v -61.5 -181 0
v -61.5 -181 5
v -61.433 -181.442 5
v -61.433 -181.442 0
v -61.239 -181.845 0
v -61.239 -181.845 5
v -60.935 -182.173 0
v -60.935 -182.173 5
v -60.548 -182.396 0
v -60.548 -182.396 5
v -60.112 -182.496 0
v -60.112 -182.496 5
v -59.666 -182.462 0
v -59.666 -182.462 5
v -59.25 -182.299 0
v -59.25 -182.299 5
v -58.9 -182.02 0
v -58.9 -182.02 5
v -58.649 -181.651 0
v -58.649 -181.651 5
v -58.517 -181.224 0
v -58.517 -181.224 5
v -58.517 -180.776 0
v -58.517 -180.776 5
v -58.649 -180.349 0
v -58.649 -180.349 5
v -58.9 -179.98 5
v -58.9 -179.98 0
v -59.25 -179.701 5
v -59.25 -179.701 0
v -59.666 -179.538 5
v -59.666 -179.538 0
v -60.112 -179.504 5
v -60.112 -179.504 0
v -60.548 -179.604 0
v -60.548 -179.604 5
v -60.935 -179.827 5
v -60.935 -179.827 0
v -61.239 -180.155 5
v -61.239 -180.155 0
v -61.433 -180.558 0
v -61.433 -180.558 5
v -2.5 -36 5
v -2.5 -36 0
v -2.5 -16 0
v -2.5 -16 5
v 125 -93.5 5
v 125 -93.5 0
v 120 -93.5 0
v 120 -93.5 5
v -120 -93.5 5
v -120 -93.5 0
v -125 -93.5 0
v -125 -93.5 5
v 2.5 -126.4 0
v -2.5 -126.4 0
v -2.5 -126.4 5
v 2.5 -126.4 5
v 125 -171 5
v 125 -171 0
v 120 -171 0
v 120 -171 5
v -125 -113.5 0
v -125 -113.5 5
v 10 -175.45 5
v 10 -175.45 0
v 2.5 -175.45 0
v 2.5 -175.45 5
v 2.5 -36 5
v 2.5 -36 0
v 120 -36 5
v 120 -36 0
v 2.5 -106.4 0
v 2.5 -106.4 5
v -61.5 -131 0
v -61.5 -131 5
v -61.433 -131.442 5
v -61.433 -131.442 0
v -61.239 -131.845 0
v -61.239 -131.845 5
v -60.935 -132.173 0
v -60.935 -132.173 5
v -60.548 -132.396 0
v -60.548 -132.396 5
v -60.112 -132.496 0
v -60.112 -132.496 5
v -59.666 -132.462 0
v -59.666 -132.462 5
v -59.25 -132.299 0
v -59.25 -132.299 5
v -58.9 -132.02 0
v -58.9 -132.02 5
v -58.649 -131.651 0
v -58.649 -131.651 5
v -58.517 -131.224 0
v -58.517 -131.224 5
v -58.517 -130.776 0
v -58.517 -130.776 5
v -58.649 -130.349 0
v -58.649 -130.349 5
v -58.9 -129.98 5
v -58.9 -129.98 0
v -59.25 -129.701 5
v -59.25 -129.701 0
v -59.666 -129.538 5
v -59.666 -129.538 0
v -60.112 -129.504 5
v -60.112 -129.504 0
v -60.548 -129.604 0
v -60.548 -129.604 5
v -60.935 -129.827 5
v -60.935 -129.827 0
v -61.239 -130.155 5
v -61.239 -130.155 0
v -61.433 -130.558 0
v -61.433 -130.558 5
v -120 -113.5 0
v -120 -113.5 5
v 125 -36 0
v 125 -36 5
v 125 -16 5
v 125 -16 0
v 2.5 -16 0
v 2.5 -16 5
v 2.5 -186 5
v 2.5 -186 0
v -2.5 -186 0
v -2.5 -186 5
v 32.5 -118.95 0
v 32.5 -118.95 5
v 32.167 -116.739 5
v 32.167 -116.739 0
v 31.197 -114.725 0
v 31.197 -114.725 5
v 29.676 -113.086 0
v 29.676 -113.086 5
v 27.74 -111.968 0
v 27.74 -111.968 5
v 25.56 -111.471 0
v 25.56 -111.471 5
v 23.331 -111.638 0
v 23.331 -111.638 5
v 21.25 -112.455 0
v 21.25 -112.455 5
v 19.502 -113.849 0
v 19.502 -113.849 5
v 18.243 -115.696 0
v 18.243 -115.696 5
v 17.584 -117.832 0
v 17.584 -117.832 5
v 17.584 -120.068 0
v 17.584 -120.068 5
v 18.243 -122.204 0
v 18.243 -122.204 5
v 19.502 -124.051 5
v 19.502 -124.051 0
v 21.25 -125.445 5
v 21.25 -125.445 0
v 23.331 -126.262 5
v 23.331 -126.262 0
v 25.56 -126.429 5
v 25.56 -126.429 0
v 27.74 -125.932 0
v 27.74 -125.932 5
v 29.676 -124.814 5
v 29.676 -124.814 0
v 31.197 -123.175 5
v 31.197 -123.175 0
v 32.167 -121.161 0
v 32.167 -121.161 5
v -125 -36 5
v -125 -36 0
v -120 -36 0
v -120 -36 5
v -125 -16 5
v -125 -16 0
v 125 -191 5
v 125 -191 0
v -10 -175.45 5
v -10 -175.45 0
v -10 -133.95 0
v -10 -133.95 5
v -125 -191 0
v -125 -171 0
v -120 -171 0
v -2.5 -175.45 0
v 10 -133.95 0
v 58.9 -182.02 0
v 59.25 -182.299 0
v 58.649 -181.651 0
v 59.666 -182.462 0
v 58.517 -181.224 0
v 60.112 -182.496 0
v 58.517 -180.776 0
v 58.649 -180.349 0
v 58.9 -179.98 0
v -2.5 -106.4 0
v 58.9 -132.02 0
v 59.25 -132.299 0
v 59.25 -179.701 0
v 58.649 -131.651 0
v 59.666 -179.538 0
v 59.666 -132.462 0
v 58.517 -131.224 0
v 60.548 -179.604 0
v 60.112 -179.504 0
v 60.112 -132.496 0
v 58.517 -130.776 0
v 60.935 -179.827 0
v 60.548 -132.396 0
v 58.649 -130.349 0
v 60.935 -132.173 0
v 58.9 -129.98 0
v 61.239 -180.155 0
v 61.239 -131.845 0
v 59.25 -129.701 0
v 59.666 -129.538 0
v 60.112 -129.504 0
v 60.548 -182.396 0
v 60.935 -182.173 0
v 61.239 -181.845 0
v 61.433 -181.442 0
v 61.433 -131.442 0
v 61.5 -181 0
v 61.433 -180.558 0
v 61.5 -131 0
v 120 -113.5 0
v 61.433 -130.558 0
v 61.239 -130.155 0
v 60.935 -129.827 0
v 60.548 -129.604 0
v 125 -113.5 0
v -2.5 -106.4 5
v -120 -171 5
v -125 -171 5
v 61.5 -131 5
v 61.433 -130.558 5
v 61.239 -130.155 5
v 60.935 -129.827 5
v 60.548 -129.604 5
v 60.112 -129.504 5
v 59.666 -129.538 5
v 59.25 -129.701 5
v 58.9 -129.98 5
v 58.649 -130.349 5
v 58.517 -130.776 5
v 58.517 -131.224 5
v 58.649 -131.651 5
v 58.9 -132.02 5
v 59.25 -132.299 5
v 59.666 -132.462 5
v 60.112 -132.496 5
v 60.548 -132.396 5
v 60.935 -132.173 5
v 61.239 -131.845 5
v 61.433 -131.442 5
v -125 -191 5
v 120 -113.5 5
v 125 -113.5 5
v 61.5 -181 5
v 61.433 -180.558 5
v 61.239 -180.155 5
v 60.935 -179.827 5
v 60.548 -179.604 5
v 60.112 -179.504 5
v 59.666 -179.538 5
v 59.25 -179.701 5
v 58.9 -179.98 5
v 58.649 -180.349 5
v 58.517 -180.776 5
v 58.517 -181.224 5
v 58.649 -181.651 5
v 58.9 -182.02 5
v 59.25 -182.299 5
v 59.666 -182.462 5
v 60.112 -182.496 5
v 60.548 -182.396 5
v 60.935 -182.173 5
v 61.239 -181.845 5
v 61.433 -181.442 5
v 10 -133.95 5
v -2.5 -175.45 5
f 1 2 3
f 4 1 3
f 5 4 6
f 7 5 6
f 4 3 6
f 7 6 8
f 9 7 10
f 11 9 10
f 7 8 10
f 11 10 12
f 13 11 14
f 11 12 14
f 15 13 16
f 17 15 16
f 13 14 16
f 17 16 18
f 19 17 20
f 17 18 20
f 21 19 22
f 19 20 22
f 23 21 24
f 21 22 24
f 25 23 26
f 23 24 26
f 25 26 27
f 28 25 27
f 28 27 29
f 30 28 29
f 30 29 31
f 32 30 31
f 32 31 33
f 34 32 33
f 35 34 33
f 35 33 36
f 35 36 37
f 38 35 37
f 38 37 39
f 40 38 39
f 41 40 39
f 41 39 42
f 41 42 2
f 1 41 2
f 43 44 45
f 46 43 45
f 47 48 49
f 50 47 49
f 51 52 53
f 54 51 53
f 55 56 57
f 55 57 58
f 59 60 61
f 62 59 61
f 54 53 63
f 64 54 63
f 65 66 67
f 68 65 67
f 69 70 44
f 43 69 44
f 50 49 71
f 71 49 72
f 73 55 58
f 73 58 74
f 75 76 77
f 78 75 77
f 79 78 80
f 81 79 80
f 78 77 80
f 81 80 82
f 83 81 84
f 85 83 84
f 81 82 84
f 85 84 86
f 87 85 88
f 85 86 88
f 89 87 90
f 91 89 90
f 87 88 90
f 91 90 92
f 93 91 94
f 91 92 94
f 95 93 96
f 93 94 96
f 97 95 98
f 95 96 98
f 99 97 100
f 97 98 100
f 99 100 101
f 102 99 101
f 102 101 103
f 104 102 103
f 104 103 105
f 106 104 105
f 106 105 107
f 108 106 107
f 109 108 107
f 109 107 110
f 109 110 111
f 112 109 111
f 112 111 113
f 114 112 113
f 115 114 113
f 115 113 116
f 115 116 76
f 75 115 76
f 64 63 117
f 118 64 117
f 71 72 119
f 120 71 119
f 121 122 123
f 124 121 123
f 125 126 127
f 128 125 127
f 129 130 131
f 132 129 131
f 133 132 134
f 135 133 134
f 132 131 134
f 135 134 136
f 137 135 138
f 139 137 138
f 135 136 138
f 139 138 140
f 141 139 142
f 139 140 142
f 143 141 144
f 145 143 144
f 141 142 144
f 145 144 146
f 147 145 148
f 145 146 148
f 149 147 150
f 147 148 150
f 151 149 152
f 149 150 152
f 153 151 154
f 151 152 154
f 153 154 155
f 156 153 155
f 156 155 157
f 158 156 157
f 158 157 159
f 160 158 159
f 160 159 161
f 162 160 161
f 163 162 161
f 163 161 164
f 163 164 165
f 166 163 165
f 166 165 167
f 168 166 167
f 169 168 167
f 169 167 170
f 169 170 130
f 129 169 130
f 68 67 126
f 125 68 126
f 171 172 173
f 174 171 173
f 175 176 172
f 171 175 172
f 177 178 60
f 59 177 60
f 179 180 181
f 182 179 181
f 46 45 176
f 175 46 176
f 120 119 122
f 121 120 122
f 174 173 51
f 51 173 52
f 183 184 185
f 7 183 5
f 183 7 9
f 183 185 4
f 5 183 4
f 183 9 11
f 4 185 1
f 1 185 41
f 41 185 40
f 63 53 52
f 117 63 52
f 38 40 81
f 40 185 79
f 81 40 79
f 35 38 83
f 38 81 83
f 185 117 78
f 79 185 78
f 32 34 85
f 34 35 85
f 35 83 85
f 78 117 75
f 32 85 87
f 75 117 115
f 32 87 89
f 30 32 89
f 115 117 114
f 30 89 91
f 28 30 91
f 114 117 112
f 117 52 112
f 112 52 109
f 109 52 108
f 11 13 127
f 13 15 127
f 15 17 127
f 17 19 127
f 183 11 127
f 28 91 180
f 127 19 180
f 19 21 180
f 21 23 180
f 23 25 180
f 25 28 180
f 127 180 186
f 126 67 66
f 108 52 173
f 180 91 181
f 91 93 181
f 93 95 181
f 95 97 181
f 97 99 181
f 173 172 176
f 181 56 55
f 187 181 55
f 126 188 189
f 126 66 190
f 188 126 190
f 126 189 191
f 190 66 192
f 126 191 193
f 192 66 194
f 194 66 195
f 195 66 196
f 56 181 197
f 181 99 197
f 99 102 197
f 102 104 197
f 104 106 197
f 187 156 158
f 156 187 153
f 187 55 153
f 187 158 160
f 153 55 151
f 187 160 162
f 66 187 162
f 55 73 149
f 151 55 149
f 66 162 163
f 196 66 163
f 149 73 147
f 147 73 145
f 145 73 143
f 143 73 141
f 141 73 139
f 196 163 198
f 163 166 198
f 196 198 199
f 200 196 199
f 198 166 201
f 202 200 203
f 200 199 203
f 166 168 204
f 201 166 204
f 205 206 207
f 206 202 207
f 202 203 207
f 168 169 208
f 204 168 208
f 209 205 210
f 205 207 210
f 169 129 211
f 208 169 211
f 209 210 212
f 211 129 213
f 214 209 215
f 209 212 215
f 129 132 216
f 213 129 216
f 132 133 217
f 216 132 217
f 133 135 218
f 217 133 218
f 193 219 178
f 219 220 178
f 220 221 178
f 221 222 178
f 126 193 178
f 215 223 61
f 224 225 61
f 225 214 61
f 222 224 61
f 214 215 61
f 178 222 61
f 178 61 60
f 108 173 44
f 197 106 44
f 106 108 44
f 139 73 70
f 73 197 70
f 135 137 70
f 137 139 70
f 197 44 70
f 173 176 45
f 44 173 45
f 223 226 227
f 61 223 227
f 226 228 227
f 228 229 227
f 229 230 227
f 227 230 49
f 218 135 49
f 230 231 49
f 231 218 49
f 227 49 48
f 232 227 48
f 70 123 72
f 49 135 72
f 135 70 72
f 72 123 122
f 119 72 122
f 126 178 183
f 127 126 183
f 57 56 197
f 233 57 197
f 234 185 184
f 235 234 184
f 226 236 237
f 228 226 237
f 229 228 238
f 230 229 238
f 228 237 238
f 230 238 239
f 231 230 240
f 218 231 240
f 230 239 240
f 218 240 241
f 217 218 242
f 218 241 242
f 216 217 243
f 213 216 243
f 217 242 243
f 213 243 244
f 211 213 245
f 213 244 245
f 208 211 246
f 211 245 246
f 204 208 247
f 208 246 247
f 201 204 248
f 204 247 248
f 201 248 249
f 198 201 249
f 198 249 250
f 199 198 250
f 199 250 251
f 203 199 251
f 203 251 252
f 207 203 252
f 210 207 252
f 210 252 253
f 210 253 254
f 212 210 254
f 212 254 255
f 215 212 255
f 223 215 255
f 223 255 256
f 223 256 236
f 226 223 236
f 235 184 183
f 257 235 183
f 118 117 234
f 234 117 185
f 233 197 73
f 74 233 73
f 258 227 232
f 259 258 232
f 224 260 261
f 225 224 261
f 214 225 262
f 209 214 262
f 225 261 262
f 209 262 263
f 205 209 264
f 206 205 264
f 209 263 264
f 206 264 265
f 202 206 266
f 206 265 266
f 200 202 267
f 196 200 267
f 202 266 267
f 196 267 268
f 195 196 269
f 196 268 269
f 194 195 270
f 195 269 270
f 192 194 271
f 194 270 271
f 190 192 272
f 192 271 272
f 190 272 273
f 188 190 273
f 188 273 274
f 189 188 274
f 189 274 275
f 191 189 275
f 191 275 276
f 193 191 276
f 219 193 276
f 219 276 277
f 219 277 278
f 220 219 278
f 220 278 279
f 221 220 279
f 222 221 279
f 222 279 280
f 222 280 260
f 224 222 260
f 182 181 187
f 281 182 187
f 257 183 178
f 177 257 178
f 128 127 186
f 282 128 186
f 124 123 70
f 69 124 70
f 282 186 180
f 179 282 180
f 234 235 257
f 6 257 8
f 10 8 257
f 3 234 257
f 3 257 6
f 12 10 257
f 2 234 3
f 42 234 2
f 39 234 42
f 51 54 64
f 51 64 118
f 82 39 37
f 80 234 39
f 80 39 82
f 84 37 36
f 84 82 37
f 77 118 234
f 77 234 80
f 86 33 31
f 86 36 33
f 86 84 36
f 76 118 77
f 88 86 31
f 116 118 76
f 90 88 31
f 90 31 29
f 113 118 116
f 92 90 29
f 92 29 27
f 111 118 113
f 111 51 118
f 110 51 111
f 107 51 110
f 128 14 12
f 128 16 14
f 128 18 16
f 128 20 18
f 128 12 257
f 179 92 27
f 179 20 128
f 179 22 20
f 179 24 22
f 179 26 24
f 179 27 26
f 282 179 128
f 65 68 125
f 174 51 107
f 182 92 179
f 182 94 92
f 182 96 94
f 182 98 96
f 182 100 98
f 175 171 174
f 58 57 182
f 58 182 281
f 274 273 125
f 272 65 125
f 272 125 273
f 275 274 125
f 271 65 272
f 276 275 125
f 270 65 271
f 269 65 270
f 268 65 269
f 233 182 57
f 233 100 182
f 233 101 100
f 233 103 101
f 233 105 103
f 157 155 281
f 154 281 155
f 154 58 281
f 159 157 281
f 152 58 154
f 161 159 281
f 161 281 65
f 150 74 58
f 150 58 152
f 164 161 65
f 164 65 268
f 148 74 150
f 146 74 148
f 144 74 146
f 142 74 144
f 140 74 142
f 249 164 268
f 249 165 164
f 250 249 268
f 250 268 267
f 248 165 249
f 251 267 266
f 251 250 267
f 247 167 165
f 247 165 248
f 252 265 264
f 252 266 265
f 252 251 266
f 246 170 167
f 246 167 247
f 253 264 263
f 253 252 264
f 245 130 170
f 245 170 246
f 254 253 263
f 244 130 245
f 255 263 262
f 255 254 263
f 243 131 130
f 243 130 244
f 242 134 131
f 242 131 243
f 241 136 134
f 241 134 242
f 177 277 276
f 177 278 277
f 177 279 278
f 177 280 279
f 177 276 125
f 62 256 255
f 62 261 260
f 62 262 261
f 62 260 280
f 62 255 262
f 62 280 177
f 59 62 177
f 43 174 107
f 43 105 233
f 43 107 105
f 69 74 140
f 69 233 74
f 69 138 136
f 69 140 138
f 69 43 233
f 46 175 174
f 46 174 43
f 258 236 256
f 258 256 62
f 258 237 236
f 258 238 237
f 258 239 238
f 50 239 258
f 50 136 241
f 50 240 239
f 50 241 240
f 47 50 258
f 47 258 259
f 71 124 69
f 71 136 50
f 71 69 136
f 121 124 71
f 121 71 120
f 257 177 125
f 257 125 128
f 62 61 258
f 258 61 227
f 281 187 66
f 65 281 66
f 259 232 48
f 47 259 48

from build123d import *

# Parameters (mm, degrees)
BOSS_EXTRU_1_OUTLINE_W  = 5
BOSS_EXTRU_1_OUTLINE_H  = 20
BOSS_EXTRU_1_DEPTH      = 5
ESQUISSE2_R             = 1.5
ENL_V_MAT_EXTRU_1_DEPTH = 229.322140845
ESQUISSE3_R             = 7.5
ENL_V_MAT_EXTRU_2_DEPTH = 229.322140845


# Read off the part's stored shape, not the designer's step: Boss.-Extru.1
with BuildPart() as part:
    # Boss.-Extru.1 outline → Boss.-Extru.1 (new body)
    with BuildSketch(Plane.XY):
        Polygon((125, -16), (2.5, -16), (2.5, -36), (-2.5, -36), (-2.5, -16), (-125, -16), (-125, -36), (-120, -36), (-120, -93.5), (-125, -93.5), (-125, -113.5), (-120, -113.5), (-120, -171), (-125, -171), (-125, -191), (125, -191), (125, -171), (120, -171), (120, -113.5), (125, -113.5), (125, -93.5), (120, -93.5), (120, -36), (125, -36), align=None)
        Polygon((10, -133.95), (10, -175.45), (2.5, -175.45), (2.5, -186), (-2.5, -186), (-2.5, -175.45), (-10, -175.45), (-10, -133.95), align=None, mode=Mode.SUBTRACT)
        with Locations((0, -116.4)):
            Rectangle(BOSS_EXTRU_1_OUTLINE_W, BOSS_EXTRU_1_OUTLINE_H, mode=Mode.SUBTRACT)
    extrude(amount=BOSS_EXTRU_1_DEPTH)

    # Esquisse2 → Enlèv. mat.-Extru.1 (cut, through all)
    with BuildSketch(Plane.XY.offset(5)):
        with Locations((60, -131)):
            Circle(ESQUISSE2_R)
        with Locations((60, -181)):
            Circle(ESQUISSE2_R)
        with Locations(Location((-60, -131, 0), (0, 0, 180))):
            Circle(ESQUISSE2_R)
        with Locations(Location((-60, -181, 0), (0, 0, 180))):
            Circle(ESQUISSE2_R)
    extrude(amount=-ENL_V_MAT_EXTRU_1_DEPTH, mode=Mode.SUBTRACT)

    # Esquisse3 → Enlèv. mat.-Extru.2 (cut, through all)
    with BuildSketch(Plane.XY.offset(5)):
        with Locations((25, -118.95)):
            Circle(ESQUISSE3_R)
    extrude(amount=-ENL_V_MAT_EXTRU_2_DEPTH, mode=Mode.SUBTRACT)


solid = part.part
